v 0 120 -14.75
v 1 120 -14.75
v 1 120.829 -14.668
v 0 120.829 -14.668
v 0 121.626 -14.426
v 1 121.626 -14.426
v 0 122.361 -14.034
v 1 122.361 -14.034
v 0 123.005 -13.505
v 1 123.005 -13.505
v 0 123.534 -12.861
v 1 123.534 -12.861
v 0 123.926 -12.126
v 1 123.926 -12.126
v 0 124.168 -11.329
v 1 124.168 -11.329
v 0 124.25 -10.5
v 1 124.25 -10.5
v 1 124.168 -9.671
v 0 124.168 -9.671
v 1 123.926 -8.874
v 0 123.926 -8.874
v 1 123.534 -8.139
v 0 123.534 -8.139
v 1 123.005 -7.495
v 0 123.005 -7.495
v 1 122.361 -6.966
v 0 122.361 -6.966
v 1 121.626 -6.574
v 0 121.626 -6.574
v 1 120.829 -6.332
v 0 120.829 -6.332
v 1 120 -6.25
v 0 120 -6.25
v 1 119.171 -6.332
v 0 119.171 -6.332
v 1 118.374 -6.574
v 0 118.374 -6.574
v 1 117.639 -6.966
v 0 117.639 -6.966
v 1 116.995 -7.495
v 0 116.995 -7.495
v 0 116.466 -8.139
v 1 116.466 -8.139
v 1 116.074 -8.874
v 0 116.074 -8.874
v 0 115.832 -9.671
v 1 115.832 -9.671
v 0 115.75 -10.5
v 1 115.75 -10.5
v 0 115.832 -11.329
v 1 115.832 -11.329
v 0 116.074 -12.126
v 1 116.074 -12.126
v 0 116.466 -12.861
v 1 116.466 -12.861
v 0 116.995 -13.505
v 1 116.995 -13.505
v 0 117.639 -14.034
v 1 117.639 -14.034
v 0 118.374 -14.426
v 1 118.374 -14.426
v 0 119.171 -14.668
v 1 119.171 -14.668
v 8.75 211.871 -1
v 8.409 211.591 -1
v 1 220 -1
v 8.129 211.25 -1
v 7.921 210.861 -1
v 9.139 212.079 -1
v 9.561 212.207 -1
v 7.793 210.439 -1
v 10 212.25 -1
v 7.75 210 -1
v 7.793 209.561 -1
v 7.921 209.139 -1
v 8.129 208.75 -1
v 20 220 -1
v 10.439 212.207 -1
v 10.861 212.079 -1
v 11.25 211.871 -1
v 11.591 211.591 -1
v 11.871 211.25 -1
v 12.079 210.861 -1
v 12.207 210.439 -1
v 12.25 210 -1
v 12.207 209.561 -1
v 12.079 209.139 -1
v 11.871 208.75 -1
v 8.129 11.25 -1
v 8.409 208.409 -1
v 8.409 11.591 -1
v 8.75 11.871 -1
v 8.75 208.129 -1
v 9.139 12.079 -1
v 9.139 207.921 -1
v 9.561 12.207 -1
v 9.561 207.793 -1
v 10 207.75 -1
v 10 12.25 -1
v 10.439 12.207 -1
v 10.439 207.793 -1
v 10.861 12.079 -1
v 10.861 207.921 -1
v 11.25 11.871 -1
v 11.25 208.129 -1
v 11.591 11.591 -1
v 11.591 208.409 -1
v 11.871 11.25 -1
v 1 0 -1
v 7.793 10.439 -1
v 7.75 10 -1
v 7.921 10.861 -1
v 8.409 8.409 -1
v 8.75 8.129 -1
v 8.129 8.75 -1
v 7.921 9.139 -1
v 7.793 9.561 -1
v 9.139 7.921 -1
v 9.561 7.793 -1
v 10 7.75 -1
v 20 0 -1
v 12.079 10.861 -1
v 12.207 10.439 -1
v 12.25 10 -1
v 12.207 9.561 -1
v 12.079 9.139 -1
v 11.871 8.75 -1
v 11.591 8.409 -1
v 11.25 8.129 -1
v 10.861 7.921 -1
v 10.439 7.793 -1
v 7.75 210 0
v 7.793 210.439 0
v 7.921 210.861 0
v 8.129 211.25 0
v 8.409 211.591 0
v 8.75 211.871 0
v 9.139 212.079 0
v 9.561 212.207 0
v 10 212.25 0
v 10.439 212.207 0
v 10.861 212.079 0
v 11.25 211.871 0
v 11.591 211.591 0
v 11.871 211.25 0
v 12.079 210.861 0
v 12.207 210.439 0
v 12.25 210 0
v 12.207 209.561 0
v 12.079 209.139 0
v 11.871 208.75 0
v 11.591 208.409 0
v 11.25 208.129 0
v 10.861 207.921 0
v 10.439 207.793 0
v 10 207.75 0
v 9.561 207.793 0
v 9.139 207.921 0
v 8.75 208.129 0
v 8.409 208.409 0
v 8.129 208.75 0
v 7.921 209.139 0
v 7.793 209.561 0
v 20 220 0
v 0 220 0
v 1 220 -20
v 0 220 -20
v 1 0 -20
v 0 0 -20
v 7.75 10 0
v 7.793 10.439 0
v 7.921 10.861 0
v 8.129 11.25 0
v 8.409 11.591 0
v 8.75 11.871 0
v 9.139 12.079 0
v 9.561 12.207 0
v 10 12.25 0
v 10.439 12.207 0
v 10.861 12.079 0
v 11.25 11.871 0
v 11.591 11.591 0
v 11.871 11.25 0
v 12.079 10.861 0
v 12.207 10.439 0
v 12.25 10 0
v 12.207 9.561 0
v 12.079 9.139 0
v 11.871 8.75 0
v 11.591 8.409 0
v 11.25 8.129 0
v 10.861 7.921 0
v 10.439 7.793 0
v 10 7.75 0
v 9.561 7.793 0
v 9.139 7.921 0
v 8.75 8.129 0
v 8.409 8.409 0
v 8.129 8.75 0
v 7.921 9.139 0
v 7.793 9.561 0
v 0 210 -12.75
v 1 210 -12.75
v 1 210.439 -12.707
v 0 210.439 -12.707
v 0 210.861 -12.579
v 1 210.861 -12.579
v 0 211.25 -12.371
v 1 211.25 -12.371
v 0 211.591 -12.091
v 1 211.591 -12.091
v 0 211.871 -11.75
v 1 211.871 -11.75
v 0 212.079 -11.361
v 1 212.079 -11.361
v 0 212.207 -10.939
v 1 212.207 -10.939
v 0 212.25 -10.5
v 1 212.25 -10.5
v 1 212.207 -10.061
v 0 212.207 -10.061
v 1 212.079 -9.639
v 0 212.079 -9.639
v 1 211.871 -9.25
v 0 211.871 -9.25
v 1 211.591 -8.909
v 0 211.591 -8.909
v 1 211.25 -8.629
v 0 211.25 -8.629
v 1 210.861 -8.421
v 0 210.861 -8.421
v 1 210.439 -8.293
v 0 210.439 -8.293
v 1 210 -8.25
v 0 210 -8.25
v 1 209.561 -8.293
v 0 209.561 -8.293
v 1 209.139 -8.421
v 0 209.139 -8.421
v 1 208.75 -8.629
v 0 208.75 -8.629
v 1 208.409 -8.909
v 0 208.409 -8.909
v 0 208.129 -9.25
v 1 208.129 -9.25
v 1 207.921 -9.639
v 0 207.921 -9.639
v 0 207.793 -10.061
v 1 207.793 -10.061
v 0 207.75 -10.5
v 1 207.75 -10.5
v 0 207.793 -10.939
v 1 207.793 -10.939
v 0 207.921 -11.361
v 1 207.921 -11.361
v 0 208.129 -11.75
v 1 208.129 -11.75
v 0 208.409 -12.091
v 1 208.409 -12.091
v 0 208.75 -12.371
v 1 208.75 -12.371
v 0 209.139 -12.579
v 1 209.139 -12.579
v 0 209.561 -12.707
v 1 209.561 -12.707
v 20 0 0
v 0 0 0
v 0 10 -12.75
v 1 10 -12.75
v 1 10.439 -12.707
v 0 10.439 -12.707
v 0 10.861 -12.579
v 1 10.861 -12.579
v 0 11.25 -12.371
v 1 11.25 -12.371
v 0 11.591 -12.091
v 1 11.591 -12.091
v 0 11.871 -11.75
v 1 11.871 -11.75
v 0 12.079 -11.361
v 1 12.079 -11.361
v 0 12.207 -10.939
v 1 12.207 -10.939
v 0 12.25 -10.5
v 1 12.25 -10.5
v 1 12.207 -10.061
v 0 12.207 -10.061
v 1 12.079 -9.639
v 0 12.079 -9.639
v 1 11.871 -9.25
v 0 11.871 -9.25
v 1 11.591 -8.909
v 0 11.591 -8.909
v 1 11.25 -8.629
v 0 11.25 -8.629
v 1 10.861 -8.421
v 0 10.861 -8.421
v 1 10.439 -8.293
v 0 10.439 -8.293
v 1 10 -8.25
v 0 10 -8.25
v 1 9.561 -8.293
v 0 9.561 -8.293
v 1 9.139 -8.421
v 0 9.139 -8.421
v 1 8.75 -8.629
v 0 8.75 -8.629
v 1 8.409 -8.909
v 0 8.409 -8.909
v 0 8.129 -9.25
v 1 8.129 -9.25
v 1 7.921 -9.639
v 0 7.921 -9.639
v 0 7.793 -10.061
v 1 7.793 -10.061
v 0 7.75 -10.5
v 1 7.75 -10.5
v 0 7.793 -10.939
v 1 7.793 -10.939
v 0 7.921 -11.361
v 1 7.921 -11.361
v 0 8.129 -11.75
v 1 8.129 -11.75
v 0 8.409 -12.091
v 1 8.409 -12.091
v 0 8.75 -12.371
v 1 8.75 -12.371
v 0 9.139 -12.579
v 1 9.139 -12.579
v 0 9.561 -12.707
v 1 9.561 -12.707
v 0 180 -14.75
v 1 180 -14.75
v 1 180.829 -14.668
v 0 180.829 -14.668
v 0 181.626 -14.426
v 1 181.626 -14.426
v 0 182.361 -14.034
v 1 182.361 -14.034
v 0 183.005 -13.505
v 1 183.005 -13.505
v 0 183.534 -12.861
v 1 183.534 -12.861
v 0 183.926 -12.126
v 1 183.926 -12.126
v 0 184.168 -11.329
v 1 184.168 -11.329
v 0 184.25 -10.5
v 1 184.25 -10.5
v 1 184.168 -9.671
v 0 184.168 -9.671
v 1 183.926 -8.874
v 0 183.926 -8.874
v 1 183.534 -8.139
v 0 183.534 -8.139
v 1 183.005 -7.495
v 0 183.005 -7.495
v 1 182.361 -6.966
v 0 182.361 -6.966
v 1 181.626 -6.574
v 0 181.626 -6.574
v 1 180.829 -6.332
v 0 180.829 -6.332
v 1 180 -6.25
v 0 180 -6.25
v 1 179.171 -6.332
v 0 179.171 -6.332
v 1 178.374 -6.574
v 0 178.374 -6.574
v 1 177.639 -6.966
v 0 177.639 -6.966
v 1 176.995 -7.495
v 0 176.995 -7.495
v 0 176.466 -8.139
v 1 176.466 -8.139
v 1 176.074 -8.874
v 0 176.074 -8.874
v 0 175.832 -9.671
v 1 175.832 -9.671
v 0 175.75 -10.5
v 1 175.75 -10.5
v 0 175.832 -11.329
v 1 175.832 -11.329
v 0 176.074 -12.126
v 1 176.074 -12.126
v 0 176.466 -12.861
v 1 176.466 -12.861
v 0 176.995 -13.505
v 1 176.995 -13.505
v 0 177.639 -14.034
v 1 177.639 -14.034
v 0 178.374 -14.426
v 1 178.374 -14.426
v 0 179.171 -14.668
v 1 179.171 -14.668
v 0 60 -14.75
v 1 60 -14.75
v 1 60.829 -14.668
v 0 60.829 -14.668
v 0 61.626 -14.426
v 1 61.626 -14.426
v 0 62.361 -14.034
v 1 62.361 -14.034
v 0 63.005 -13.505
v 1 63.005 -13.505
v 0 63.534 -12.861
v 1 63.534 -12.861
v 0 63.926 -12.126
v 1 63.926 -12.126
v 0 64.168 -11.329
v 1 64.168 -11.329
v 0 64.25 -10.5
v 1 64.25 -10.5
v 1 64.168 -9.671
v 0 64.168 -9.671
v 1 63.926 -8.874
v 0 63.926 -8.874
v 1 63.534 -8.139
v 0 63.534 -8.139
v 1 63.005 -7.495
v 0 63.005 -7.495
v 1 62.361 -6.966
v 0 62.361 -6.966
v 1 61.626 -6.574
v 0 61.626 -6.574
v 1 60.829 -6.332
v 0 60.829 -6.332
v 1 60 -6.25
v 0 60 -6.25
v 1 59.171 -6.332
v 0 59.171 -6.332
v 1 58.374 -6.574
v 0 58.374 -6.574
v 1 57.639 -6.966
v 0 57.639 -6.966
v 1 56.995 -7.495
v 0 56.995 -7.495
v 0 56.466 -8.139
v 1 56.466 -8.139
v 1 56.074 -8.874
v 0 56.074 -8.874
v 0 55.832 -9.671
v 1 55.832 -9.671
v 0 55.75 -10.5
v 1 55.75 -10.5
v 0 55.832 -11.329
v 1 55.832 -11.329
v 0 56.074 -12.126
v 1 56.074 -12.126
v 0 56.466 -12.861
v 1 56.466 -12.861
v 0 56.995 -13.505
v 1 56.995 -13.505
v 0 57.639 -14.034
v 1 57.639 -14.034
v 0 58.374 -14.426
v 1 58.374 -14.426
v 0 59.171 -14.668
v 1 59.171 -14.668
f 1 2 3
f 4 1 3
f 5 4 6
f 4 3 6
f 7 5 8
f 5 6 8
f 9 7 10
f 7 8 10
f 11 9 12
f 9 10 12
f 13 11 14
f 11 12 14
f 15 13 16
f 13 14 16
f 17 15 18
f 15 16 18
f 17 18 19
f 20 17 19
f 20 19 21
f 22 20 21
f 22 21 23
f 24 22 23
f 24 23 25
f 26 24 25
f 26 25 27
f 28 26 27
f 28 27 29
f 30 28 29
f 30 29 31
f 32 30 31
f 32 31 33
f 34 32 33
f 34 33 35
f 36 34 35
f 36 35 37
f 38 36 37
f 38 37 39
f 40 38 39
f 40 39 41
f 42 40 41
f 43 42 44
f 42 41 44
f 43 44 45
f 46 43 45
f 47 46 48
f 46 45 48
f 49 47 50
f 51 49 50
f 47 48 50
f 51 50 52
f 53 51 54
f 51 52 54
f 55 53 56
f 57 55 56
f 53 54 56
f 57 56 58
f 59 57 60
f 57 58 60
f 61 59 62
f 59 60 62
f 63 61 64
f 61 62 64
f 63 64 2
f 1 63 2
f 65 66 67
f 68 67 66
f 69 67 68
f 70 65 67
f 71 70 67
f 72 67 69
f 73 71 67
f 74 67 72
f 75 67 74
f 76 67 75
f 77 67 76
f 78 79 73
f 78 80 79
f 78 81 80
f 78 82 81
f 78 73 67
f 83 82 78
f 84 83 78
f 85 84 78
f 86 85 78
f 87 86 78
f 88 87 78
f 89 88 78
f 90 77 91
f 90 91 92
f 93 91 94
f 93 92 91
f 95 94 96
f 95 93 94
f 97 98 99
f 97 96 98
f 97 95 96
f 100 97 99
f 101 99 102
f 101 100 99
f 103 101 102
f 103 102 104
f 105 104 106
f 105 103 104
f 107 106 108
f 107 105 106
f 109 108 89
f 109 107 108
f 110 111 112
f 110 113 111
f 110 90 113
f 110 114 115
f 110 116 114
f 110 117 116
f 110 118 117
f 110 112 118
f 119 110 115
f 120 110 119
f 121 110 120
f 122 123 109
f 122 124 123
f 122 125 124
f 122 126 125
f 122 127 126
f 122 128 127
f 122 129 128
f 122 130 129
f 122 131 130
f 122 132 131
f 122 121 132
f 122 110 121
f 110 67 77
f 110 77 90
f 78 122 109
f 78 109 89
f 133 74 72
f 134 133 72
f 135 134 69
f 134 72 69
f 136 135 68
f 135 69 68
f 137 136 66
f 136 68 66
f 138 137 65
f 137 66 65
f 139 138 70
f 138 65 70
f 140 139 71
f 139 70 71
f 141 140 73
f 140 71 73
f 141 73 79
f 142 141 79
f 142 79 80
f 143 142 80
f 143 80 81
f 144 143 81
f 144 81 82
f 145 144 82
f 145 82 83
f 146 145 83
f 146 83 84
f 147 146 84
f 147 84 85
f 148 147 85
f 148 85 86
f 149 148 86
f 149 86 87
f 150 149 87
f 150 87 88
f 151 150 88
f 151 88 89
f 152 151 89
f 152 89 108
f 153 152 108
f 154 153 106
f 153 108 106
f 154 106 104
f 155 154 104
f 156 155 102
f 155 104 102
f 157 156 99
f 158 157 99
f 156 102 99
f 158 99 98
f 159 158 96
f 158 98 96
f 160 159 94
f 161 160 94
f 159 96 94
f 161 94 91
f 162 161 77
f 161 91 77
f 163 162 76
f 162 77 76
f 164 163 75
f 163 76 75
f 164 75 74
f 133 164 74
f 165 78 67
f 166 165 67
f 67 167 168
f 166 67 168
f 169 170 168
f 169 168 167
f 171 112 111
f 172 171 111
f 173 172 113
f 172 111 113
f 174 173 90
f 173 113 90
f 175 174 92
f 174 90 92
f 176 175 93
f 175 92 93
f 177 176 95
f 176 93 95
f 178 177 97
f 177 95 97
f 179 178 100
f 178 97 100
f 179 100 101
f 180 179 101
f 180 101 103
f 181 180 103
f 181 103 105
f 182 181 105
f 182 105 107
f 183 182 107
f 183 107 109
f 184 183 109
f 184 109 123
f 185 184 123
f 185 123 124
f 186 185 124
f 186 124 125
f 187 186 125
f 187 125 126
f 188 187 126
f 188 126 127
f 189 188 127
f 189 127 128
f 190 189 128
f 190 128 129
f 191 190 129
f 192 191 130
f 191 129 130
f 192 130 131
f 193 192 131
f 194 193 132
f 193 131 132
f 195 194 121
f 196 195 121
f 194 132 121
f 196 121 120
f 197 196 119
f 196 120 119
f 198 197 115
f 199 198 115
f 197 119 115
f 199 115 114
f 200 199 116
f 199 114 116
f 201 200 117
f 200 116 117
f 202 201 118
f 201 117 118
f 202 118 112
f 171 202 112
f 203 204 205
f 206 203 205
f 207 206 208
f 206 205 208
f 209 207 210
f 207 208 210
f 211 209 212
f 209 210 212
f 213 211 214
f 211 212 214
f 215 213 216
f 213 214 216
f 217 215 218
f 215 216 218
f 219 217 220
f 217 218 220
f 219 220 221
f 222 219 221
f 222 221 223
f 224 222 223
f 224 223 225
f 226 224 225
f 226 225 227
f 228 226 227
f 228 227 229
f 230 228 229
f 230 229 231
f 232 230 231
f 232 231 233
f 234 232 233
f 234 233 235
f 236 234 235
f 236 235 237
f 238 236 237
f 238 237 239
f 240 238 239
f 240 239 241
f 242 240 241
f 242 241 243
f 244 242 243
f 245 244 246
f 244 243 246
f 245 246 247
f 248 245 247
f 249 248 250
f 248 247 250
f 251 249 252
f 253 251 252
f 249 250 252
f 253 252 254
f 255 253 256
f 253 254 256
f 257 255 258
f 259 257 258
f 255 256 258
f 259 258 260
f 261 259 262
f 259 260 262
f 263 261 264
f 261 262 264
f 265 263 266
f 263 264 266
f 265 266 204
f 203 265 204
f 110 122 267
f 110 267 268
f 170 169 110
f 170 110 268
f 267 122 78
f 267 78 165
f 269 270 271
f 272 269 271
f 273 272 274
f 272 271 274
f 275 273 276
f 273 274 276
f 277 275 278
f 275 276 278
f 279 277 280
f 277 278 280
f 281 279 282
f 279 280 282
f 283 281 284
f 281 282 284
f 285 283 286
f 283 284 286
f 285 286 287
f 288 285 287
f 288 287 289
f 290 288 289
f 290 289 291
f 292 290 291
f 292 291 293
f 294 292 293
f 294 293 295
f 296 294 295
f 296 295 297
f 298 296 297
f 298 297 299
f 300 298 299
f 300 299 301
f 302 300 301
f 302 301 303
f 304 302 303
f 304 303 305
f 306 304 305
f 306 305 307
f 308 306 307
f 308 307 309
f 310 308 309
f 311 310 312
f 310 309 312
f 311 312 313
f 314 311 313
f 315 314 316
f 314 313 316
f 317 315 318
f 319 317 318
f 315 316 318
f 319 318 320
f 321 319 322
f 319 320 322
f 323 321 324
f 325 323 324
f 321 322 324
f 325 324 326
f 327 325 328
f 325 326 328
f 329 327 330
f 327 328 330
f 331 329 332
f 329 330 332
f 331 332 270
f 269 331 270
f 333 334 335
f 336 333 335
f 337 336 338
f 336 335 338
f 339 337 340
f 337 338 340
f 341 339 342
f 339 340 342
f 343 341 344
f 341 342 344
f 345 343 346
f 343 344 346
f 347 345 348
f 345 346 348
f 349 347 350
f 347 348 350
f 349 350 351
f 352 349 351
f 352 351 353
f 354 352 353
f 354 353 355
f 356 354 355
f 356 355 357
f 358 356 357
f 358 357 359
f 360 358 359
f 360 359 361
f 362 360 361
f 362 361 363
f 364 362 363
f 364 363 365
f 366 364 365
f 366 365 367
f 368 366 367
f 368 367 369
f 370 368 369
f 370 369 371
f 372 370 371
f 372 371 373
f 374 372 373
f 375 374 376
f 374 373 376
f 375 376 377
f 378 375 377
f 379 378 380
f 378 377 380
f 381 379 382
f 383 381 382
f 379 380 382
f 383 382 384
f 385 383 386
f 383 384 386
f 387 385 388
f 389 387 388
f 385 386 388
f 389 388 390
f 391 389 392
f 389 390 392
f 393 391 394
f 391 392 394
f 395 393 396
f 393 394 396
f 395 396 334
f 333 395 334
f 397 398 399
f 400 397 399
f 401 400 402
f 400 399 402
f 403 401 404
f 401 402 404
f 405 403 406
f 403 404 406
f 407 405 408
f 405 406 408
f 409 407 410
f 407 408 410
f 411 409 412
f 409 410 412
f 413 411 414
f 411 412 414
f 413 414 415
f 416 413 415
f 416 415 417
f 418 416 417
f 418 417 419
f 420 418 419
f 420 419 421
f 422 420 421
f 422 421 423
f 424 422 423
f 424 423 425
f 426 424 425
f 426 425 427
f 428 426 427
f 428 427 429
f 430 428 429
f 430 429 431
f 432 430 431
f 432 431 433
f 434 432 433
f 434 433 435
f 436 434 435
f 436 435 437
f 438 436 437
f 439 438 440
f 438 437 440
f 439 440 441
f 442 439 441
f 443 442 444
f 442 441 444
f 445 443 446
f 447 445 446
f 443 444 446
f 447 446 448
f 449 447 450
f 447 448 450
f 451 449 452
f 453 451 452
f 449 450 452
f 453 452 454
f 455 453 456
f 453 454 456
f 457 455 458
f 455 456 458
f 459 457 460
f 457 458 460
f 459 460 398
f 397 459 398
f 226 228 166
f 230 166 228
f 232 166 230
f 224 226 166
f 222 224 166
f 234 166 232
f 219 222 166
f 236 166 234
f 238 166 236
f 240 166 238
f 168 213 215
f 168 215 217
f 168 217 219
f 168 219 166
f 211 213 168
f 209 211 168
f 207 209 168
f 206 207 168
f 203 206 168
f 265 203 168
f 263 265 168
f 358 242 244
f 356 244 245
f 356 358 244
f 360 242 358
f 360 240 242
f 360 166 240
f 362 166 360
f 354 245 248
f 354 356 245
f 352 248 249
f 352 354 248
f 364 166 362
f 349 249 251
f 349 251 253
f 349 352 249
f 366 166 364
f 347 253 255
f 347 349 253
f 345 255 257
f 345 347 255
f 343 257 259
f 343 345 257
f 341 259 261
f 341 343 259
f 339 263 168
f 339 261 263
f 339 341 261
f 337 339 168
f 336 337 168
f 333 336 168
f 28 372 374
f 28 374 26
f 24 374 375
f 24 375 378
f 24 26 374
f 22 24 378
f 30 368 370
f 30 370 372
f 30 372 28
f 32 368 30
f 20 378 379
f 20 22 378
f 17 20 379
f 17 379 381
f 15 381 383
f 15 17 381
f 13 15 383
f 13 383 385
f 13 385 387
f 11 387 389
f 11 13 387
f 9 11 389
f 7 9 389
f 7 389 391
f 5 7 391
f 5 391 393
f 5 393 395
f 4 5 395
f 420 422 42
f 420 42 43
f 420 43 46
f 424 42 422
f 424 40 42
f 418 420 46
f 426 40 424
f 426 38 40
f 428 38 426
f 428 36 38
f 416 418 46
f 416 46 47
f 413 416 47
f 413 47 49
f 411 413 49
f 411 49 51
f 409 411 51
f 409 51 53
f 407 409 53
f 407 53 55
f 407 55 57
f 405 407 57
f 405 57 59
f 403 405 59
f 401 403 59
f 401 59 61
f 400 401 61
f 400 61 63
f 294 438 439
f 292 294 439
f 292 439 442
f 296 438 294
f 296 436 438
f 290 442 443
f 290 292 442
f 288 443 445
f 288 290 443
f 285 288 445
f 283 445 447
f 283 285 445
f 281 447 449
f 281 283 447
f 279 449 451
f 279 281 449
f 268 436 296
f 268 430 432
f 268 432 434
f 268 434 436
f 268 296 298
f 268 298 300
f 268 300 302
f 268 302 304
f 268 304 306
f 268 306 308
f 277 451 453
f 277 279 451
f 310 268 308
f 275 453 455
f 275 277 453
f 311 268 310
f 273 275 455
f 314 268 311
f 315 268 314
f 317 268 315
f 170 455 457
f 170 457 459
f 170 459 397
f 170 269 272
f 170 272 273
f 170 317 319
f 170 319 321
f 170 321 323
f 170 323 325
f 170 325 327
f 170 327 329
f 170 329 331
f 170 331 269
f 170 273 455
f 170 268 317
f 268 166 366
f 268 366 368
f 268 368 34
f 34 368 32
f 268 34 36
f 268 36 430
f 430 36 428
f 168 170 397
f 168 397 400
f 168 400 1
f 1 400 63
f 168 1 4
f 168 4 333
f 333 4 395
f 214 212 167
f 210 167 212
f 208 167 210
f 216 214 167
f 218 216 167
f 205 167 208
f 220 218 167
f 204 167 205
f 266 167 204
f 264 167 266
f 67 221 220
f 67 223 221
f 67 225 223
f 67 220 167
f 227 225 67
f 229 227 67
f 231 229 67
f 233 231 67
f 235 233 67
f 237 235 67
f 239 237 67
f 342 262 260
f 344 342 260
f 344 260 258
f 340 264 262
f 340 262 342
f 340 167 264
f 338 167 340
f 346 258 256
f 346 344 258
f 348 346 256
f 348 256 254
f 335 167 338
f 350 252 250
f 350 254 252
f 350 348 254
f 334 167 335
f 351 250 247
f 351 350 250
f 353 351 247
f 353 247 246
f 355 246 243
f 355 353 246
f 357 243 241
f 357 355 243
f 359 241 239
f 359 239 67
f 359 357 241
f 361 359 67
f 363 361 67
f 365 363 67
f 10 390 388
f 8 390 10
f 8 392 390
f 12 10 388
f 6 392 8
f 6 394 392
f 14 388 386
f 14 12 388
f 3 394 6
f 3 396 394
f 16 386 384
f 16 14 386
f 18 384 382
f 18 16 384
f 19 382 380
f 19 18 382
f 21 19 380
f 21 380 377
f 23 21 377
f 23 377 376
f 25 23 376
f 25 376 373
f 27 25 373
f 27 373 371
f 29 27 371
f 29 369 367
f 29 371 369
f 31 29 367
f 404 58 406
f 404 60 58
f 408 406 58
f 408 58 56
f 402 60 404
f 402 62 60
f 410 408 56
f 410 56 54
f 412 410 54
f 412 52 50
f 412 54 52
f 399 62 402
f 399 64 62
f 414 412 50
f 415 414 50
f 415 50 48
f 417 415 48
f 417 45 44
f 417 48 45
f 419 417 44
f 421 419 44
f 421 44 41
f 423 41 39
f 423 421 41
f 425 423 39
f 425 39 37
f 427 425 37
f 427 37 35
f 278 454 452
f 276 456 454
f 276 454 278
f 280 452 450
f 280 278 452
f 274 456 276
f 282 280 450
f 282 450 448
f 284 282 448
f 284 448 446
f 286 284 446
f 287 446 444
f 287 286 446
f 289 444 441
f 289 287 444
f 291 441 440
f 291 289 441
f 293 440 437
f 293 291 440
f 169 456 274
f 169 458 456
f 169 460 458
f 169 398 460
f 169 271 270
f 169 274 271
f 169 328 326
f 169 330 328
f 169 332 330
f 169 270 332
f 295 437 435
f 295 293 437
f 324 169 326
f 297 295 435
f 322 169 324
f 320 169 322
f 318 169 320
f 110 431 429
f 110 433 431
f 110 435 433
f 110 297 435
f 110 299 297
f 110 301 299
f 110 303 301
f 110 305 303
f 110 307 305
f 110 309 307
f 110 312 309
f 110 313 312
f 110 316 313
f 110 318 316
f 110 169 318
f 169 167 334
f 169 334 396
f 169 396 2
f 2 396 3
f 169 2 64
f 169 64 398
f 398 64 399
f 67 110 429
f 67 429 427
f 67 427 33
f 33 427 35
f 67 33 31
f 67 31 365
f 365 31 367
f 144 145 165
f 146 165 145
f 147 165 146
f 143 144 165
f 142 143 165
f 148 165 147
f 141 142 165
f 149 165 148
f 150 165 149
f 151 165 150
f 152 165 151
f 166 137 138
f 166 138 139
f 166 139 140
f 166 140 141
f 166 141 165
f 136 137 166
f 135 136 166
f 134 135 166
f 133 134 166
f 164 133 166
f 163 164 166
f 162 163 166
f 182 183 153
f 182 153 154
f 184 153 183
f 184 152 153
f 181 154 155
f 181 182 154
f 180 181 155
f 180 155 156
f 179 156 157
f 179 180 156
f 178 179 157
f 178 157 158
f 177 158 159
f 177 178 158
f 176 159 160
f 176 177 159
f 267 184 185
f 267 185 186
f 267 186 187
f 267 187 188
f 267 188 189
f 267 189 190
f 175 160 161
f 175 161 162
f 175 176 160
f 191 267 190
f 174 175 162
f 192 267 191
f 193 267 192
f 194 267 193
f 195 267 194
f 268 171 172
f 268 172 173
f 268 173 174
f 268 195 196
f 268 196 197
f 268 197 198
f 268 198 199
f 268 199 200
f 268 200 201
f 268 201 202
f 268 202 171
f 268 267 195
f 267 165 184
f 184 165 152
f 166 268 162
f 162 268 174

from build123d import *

# Parameters (mm, degrees)
EXTRUDE_1_DEPTH     = 220
SKETCH_2_R          = 4.25
CUT_EXTRUDE_1_DEPTH = 2
SKETCH_3_R          = 2.25
CUT_EXTRUDE_2_DEPTH = 2
SKETCH_4_R          = 2.25
CUT_EXTRUDE_3_DEPTH = 2
SKETCH_5_R          = 2.25
CUT_EXTRUDE_4_DEPTH = 2


with BuildPart() as part:
    # Эскиз1 → Бобышка-Вытянуть1 (new body)
    with BuildSketch(Plane(origin=(0, 0, 0), x_dir=(1, 0, 0), z_dir=(0, 1, 0))):
        Polygon((0, 0), (0, 20), (1, 20), (1, 1), (20, 1), (20, 0), align=None)
    extrude(amount=EXTRUDE_1_DEPTH)

    # Эскиз2 → Вырез-Вытянуть1 (cut, through all)
    with BuildSketch(Plane(origin=(1, 0, 0), x_dir=(0, 0, -1), z_dir=(1, 0, 0))):
        with Locations((10.5, 180)):
            Circle(SKETCH_2_R)
        with Locations((10.5, 120)):
            Circle(SKETCH_2_R)
        with Locations((10.5, 60)):
            Circle(SKETCH_2_R)
    extrude(amount=-CUT_EXTRUDE_1_DEPTH, mode=Mode.SUBTRACT)

    # Эскиз3 → Вырез-Вытянуть2 (cut, through all)
    with BuildSketch(Plane(origin=(1, 0, 0), x_dir=(0, 0, -1), z_dir=(1, 0, 0))):
        with Locations((10.5, 10)):
            Circle(SKETCH_3_R)
    extrude(amount=-CUT_EXTRUDE_2_DEPTH, mode=Mode.SUBTRACT)

    # Эскиз4 → Вырез-Вытянуть3 (cut, through all)
    with BuildSketch(Plane(origin=(1, 0, 0), x_dir=(0, 0, -1), z_dir=(1, 0, 0))):
        with Locations((10.5, 210)):
            Circle(SKETCH_4_R)
    extrude(amount=-CUT_EXTRUDE_3_DEPTH, mode=Mode.SUBTRACT)

    # Эскиз5 → Вырез-Вытянуть4 (cut, through all)
    with BuildSketch(Plane(origin=(0, 0, -1), x_dir=(-1, 0, 0), z_dir=(0, 0, -1))):
        with Locations((-10, 10)):
            Circle(SKETCH_5_R)
        with Locations((-10, 210)):
            Circle(SKETCH_5_R)
    extrude(amount=-CUT_EXTRUDE_4_DEPTH, mode=Mode.SUBTRACT)


solid = part.part
